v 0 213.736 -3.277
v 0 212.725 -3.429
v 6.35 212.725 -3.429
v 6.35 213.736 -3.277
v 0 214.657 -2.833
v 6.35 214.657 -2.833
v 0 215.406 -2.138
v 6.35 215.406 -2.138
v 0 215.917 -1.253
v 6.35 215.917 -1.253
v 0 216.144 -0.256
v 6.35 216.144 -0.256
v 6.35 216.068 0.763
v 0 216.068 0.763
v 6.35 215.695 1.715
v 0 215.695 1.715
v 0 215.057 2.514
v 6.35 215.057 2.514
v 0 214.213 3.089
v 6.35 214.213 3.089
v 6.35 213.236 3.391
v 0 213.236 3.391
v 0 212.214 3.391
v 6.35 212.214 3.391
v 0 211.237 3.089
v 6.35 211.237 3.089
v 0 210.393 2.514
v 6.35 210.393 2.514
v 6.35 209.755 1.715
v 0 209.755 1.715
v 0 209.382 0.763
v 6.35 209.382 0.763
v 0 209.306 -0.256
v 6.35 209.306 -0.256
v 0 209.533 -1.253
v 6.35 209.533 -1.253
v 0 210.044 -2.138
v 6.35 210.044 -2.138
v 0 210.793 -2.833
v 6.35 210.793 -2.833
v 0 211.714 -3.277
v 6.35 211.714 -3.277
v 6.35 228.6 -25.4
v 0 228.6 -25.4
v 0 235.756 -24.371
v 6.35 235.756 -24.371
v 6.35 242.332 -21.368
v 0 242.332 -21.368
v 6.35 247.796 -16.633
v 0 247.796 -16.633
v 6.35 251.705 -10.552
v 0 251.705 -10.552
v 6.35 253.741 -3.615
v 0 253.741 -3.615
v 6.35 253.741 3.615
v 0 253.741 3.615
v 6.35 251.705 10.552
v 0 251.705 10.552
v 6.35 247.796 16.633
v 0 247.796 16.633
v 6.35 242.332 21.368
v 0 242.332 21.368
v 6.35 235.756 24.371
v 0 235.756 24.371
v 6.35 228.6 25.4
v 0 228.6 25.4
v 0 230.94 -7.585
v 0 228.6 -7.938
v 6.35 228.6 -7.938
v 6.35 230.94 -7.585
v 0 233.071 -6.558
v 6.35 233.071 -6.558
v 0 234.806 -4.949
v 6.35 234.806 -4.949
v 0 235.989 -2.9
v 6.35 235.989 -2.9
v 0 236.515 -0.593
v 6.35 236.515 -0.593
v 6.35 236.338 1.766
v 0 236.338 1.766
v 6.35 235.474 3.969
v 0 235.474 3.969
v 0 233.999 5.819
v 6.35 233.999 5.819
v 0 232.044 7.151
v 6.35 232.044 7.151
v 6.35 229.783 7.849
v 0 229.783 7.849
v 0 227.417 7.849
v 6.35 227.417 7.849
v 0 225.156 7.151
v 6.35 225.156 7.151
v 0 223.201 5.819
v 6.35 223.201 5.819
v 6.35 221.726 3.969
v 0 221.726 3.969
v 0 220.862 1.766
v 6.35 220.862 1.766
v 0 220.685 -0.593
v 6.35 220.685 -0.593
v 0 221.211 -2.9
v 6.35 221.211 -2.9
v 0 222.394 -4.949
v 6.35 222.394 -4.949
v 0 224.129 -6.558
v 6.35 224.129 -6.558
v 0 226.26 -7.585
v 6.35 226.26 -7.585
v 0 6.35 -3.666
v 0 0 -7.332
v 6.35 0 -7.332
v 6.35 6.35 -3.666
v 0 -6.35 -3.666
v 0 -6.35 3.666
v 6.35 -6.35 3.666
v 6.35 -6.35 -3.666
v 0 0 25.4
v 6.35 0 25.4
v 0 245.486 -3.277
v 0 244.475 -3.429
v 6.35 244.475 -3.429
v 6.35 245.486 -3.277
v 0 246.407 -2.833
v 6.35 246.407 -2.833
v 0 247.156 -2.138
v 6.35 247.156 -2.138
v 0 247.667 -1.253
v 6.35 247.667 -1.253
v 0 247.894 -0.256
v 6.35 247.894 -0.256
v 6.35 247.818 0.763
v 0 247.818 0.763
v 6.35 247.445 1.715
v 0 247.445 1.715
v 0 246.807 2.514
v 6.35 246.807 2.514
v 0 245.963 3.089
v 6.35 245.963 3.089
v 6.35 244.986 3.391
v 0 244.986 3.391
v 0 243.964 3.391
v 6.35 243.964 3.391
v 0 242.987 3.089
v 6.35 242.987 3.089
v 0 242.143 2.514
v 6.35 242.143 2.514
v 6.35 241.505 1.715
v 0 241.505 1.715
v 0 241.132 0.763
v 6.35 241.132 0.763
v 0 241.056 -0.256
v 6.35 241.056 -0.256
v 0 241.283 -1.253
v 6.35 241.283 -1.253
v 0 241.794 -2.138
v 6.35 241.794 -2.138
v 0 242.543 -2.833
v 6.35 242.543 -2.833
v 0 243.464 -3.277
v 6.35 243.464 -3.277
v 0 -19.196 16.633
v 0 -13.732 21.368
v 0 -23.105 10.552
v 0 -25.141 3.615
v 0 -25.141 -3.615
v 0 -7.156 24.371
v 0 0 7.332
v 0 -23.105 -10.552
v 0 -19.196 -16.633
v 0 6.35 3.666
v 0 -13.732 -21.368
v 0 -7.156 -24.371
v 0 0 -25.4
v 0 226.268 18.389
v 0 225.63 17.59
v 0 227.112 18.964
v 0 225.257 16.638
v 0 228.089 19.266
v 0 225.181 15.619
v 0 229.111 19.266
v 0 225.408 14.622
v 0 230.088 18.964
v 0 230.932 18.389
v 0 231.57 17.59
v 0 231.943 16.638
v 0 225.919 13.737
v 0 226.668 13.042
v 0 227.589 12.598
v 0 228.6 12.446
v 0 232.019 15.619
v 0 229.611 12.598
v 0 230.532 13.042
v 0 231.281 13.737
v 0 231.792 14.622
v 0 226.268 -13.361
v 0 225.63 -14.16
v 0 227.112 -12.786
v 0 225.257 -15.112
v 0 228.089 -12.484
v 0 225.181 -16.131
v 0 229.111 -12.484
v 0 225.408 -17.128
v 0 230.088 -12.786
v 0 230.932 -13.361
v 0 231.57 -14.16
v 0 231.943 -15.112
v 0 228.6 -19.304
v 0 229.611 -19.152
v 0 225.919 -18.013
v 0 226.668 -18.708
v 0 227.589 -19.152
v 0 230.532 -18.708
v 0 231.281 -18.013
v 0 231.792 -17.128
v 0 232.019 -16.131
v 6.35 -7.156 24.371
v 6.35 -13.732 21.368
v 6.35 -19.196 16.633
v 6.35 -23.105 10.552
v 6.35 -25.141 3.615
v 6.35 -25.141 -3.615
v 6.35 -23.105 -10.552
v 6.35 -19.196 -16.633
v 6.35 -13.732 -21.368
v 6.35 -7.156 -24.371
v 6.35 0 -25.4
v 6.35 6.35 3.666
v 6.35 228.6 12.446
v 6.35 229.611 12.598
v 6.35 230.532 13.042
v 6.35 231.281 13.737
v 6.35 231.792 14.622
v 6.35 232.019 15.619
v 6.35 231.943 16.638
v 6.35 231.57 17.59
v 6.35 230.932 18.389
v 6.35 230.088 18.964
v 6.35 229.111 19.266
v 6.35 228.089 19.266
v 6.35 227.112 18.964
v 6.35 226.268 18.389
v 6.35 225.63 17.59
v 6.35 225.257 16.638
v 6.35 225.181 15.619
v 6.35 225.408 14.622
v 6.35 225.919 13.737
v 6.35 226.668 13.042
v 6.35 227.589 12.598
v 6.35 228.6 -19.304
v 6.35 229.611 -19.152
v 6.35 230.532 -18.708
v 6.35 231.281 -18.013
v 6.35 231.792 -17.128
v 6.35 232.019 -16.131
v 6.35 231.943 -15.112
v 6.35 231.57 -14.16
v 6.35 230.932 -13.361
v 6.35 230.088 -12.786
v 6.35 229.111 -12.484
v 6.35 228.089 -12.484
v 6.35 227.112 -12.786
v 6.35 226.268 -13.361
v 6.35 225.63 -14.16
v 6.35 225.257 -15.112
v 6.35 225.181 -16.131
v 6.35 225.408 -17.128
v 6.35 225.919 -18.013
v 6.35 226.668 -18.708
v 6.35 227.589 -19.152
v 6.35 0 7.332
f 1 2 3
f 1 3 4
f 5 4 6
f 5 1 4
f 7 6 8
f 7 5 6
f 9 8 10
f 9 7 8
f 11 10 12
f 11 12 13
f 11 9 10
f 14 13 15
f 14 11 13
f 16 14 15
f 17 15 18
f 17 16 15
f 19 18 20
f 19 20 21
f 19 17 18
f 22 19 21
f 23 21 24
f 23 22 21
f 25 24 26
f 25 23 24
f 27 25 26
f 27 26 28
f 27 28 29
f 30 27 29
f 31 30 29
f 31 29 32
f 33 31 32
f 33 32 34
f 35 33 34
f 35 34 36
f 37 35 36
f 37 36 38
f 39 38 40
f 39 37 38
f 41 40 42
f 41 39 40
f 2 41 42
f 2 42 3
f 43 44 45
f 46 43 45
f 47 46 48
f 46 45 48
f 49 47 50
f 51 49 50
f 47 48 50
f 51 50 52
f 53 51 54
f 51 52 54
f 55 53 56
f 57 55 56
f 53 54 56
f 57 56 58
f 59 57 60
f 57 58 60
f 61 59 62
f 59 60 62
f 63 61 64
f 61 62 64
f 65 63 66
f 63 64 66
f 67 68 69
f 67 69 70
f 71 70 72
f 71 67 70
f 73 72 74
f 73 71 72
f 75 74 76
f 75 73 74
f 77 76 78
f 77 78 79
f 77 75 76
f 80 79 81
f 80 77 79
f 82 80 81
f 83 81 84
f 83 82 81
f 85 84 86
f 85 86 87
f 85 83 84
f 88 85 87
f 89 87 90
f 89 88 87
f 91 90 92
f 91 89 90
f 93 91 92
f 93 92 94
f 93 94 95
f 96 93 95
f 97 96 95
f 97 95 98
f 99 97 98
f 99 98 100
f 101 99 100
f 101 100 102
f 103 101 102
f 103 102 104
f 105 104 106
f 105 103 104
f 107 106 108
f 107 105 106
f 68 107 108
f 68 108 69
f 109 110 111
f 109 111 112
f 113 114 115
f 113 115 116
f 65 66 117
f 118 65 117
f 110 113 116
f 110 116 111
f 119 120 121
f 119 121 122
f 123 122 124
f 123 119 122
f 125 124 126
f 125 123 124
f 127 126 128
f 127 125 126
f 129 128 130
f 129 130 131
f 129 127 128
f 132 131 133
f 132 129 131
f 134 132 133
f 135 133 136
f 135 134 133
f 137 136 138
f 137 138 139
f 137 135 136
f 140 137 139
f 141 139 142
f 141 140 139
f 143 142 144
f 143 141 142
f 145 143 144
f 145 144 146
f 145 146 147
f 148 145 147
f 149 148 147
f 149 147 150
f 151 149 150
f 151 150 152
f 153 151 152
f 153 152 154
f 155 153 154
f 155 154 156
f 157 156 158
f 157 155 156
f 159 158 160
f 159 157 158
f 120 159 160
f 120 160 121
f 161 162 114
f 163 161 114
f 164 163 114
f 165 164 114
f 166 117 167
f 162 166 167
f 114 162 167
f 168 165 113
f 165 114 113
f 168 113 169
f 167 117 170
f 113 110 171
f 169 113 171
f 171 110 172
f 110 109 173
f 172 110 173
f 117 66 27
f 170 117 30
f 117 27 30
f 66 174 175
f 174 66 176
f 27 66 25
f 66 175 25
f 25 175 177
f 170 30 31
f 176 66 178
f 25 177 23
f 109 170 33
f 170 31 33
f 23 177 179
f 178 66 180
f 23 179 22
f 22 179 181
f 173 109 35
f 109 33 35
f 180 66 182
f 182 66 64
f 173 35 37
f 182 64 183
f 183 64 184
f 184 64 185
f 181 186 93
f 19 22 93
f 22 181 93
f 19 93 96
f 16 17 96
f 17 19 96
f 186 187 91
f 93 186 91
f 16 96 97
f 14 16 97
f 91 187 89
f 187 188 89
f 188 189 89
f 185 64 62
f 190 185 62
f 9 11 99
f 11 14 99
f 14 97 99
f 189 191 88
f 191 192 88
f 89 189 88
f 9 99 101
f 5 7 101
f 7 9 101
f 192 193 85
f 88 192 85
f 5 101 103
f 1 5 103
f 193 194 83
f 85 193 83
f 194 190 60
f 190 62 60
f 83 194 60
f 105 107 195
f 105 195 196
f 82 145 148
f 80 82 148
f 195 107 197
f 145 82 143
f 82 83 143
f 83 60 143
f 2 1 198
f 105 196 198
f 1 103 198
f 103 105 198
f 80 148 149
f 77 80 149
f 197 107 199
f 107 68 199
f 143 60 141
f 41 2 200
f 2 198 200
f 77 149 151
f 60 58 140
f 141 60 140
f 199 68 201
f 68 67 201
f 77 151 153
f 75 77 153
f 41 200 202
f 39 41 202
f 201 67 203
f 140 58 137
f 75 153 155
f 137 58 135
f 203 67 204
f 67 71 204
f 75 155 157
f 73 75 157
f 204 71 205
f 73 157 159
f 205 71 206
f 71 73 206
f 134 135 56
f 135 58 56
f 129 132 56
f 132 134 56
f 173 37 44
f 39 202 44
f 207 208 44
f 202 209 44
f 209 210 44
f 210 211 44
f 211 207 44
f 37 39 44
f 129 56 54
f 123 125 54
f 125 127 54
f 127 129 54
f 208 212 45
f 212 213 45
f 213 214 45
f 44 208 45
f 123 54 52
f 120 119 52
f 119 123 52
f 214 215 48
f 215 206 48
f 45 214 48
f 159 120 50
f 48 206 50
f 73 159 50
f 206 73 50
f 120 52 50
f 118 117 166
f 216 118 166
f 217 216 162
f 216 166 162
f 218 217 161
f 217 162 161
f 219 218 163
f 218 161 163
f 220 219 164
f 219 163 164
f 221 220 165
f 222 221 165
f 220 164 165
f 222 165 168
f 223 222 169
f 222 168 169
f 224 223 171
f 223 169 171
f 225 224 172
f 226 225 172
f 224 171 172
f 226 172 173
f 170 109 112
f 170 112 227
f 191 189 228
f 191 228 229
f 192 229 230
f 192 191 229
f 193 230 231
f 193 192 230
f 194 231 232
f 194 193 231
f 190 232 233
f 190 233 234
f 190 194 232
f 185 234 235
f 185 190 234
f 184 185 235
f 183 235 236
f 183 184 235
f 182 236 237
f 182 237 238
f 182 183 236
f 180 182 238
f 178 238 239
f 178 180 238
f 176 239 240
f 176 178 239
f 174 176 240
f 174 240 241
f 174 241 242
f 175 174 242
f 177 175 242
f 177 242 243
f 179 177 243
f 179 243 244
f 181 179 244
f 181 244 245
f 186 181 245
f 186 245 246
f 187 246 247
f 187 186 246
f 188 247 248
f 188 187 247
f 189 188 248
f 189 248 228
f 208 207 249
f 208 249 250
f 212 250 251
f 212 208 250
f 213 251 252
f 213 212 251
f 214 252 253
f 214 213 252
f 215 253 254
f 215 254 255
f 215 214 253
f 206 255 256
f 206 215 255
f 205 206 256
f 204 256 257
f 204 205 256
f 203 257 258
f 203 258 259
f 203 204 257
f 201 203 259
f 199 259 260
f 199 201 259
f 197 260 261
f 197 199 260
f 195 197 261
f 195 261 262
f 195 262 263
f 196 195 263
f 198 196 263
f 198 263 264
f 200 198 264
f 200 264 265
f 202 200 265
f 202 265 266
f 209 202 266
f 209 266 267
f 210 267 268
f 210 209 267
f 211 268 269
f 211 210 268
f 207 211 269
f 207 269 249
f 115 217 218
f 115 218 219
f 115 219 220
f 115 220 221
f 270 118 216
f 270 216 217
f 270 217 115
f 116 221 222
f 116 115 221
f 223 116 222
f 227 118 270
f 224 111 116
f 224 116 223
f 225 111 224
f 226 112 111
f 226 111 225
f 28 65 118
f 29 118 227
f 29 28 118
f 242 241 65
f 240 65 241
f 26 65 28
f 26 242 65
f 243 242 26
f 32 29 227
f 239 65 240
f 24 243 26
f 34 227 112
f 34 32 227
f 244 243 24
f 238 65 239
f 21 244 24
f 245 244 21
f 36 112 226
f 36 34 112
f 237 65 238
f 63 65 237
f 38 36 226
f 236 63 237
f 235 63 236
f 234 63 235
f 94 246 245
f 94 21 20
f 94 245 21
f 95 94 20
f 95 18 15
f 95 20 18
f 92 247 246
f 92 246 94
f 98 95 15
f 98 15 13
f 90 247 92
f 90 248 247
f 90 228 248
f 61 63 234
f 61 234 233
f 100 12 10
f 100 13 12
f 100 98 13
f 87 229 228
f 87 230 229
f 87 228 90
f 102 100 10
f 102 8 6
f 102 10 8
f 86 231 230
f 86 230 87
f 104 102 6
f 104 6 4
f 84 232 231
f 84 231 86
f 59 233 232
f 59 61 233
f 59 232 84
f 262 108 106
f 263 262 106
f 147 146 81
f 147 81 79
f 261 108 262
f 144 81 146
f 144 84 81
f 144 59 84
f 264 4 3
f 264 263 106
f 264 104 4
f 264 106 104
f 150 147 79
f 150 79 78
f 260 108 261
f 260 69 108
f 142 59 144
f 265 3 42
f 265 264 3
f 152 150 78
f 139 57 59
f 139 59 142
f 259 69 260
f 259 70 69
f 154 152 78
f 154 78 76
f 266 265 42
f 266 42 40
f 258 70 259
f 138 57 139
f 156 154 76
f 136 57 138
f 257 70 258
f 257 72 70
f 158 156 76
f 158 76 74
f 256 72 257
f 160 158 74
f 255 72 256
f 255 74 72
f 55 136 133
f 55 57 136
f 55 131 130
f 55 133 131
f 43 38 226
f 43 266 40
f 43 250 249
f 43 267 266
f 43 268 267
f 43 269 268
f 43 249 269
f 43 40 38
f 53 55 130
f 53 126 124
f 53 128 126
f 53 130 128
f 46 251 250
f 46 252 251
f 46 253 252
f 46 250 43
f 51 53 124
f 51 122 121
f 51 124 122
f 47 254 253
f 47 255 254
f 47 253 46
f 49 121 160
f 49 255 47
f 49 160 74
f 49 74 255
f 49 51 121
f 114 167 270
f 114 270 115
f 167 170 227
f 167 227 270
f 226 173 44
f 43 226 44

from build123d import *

# Parameters (mm, degrees)
SKETCH1_R           = 7.9375
SKETCH1_R_2         = 3.429
BOSS_EXTRUDE1_DEPTH = 6.35


with BuildPart() as part:
    # Sketch1 → Boss-Extrude1 (new body)
    with BuildSketch(Plane(origin=(0, 0, 0), x_dir=(0, 0, -1), z_dir=(1, 0, 0))):
        with BuildLine():
            Line((-25.4, 228.6), (-25.4, 0))
            ThreePointArc((-25.4, 0), (0, -25.4), (25.4, 0))
            Line((25.4, 0), (25.4, 228.6))
            ThreePointArc((25.4, 228.6), (0, 254), (-25.4, 228.6))
        make_face()
        with Locations((0, 228.6)):
            Circle(SKETCH1_R, mode=Mode.SUBTRACT)
        with Locations((0, 212.725)):
            Circle(SKETCH1_R_2, mode=Mode.SUBTRACT)
        with Locations((-15.875, 228.6)):
            Circle(SKETCH1_R_2, mode=Mode.SUBTRACT)
        with Locations((0, 244.475)):
            Circle(SKETCH1_R_2, mode=Mode.SUBTRACT)
        with Locations((15.875, 228.6)):
            Circle(SKETCH1_R_2, mode=Mode.SUBTRACT)
        Polygon((7.332348419, 0), (3.666174209, 6.35), (-3.666174209, 6.35), (-7.332348419, 0), (-3.666174209, -6.35), (3.666174209, -6.35), align=None, mode=Mode.SUBTRACT)
    extrude(amount=BOSS_EXTRUDE1_DEPTH)


solid = part.part
